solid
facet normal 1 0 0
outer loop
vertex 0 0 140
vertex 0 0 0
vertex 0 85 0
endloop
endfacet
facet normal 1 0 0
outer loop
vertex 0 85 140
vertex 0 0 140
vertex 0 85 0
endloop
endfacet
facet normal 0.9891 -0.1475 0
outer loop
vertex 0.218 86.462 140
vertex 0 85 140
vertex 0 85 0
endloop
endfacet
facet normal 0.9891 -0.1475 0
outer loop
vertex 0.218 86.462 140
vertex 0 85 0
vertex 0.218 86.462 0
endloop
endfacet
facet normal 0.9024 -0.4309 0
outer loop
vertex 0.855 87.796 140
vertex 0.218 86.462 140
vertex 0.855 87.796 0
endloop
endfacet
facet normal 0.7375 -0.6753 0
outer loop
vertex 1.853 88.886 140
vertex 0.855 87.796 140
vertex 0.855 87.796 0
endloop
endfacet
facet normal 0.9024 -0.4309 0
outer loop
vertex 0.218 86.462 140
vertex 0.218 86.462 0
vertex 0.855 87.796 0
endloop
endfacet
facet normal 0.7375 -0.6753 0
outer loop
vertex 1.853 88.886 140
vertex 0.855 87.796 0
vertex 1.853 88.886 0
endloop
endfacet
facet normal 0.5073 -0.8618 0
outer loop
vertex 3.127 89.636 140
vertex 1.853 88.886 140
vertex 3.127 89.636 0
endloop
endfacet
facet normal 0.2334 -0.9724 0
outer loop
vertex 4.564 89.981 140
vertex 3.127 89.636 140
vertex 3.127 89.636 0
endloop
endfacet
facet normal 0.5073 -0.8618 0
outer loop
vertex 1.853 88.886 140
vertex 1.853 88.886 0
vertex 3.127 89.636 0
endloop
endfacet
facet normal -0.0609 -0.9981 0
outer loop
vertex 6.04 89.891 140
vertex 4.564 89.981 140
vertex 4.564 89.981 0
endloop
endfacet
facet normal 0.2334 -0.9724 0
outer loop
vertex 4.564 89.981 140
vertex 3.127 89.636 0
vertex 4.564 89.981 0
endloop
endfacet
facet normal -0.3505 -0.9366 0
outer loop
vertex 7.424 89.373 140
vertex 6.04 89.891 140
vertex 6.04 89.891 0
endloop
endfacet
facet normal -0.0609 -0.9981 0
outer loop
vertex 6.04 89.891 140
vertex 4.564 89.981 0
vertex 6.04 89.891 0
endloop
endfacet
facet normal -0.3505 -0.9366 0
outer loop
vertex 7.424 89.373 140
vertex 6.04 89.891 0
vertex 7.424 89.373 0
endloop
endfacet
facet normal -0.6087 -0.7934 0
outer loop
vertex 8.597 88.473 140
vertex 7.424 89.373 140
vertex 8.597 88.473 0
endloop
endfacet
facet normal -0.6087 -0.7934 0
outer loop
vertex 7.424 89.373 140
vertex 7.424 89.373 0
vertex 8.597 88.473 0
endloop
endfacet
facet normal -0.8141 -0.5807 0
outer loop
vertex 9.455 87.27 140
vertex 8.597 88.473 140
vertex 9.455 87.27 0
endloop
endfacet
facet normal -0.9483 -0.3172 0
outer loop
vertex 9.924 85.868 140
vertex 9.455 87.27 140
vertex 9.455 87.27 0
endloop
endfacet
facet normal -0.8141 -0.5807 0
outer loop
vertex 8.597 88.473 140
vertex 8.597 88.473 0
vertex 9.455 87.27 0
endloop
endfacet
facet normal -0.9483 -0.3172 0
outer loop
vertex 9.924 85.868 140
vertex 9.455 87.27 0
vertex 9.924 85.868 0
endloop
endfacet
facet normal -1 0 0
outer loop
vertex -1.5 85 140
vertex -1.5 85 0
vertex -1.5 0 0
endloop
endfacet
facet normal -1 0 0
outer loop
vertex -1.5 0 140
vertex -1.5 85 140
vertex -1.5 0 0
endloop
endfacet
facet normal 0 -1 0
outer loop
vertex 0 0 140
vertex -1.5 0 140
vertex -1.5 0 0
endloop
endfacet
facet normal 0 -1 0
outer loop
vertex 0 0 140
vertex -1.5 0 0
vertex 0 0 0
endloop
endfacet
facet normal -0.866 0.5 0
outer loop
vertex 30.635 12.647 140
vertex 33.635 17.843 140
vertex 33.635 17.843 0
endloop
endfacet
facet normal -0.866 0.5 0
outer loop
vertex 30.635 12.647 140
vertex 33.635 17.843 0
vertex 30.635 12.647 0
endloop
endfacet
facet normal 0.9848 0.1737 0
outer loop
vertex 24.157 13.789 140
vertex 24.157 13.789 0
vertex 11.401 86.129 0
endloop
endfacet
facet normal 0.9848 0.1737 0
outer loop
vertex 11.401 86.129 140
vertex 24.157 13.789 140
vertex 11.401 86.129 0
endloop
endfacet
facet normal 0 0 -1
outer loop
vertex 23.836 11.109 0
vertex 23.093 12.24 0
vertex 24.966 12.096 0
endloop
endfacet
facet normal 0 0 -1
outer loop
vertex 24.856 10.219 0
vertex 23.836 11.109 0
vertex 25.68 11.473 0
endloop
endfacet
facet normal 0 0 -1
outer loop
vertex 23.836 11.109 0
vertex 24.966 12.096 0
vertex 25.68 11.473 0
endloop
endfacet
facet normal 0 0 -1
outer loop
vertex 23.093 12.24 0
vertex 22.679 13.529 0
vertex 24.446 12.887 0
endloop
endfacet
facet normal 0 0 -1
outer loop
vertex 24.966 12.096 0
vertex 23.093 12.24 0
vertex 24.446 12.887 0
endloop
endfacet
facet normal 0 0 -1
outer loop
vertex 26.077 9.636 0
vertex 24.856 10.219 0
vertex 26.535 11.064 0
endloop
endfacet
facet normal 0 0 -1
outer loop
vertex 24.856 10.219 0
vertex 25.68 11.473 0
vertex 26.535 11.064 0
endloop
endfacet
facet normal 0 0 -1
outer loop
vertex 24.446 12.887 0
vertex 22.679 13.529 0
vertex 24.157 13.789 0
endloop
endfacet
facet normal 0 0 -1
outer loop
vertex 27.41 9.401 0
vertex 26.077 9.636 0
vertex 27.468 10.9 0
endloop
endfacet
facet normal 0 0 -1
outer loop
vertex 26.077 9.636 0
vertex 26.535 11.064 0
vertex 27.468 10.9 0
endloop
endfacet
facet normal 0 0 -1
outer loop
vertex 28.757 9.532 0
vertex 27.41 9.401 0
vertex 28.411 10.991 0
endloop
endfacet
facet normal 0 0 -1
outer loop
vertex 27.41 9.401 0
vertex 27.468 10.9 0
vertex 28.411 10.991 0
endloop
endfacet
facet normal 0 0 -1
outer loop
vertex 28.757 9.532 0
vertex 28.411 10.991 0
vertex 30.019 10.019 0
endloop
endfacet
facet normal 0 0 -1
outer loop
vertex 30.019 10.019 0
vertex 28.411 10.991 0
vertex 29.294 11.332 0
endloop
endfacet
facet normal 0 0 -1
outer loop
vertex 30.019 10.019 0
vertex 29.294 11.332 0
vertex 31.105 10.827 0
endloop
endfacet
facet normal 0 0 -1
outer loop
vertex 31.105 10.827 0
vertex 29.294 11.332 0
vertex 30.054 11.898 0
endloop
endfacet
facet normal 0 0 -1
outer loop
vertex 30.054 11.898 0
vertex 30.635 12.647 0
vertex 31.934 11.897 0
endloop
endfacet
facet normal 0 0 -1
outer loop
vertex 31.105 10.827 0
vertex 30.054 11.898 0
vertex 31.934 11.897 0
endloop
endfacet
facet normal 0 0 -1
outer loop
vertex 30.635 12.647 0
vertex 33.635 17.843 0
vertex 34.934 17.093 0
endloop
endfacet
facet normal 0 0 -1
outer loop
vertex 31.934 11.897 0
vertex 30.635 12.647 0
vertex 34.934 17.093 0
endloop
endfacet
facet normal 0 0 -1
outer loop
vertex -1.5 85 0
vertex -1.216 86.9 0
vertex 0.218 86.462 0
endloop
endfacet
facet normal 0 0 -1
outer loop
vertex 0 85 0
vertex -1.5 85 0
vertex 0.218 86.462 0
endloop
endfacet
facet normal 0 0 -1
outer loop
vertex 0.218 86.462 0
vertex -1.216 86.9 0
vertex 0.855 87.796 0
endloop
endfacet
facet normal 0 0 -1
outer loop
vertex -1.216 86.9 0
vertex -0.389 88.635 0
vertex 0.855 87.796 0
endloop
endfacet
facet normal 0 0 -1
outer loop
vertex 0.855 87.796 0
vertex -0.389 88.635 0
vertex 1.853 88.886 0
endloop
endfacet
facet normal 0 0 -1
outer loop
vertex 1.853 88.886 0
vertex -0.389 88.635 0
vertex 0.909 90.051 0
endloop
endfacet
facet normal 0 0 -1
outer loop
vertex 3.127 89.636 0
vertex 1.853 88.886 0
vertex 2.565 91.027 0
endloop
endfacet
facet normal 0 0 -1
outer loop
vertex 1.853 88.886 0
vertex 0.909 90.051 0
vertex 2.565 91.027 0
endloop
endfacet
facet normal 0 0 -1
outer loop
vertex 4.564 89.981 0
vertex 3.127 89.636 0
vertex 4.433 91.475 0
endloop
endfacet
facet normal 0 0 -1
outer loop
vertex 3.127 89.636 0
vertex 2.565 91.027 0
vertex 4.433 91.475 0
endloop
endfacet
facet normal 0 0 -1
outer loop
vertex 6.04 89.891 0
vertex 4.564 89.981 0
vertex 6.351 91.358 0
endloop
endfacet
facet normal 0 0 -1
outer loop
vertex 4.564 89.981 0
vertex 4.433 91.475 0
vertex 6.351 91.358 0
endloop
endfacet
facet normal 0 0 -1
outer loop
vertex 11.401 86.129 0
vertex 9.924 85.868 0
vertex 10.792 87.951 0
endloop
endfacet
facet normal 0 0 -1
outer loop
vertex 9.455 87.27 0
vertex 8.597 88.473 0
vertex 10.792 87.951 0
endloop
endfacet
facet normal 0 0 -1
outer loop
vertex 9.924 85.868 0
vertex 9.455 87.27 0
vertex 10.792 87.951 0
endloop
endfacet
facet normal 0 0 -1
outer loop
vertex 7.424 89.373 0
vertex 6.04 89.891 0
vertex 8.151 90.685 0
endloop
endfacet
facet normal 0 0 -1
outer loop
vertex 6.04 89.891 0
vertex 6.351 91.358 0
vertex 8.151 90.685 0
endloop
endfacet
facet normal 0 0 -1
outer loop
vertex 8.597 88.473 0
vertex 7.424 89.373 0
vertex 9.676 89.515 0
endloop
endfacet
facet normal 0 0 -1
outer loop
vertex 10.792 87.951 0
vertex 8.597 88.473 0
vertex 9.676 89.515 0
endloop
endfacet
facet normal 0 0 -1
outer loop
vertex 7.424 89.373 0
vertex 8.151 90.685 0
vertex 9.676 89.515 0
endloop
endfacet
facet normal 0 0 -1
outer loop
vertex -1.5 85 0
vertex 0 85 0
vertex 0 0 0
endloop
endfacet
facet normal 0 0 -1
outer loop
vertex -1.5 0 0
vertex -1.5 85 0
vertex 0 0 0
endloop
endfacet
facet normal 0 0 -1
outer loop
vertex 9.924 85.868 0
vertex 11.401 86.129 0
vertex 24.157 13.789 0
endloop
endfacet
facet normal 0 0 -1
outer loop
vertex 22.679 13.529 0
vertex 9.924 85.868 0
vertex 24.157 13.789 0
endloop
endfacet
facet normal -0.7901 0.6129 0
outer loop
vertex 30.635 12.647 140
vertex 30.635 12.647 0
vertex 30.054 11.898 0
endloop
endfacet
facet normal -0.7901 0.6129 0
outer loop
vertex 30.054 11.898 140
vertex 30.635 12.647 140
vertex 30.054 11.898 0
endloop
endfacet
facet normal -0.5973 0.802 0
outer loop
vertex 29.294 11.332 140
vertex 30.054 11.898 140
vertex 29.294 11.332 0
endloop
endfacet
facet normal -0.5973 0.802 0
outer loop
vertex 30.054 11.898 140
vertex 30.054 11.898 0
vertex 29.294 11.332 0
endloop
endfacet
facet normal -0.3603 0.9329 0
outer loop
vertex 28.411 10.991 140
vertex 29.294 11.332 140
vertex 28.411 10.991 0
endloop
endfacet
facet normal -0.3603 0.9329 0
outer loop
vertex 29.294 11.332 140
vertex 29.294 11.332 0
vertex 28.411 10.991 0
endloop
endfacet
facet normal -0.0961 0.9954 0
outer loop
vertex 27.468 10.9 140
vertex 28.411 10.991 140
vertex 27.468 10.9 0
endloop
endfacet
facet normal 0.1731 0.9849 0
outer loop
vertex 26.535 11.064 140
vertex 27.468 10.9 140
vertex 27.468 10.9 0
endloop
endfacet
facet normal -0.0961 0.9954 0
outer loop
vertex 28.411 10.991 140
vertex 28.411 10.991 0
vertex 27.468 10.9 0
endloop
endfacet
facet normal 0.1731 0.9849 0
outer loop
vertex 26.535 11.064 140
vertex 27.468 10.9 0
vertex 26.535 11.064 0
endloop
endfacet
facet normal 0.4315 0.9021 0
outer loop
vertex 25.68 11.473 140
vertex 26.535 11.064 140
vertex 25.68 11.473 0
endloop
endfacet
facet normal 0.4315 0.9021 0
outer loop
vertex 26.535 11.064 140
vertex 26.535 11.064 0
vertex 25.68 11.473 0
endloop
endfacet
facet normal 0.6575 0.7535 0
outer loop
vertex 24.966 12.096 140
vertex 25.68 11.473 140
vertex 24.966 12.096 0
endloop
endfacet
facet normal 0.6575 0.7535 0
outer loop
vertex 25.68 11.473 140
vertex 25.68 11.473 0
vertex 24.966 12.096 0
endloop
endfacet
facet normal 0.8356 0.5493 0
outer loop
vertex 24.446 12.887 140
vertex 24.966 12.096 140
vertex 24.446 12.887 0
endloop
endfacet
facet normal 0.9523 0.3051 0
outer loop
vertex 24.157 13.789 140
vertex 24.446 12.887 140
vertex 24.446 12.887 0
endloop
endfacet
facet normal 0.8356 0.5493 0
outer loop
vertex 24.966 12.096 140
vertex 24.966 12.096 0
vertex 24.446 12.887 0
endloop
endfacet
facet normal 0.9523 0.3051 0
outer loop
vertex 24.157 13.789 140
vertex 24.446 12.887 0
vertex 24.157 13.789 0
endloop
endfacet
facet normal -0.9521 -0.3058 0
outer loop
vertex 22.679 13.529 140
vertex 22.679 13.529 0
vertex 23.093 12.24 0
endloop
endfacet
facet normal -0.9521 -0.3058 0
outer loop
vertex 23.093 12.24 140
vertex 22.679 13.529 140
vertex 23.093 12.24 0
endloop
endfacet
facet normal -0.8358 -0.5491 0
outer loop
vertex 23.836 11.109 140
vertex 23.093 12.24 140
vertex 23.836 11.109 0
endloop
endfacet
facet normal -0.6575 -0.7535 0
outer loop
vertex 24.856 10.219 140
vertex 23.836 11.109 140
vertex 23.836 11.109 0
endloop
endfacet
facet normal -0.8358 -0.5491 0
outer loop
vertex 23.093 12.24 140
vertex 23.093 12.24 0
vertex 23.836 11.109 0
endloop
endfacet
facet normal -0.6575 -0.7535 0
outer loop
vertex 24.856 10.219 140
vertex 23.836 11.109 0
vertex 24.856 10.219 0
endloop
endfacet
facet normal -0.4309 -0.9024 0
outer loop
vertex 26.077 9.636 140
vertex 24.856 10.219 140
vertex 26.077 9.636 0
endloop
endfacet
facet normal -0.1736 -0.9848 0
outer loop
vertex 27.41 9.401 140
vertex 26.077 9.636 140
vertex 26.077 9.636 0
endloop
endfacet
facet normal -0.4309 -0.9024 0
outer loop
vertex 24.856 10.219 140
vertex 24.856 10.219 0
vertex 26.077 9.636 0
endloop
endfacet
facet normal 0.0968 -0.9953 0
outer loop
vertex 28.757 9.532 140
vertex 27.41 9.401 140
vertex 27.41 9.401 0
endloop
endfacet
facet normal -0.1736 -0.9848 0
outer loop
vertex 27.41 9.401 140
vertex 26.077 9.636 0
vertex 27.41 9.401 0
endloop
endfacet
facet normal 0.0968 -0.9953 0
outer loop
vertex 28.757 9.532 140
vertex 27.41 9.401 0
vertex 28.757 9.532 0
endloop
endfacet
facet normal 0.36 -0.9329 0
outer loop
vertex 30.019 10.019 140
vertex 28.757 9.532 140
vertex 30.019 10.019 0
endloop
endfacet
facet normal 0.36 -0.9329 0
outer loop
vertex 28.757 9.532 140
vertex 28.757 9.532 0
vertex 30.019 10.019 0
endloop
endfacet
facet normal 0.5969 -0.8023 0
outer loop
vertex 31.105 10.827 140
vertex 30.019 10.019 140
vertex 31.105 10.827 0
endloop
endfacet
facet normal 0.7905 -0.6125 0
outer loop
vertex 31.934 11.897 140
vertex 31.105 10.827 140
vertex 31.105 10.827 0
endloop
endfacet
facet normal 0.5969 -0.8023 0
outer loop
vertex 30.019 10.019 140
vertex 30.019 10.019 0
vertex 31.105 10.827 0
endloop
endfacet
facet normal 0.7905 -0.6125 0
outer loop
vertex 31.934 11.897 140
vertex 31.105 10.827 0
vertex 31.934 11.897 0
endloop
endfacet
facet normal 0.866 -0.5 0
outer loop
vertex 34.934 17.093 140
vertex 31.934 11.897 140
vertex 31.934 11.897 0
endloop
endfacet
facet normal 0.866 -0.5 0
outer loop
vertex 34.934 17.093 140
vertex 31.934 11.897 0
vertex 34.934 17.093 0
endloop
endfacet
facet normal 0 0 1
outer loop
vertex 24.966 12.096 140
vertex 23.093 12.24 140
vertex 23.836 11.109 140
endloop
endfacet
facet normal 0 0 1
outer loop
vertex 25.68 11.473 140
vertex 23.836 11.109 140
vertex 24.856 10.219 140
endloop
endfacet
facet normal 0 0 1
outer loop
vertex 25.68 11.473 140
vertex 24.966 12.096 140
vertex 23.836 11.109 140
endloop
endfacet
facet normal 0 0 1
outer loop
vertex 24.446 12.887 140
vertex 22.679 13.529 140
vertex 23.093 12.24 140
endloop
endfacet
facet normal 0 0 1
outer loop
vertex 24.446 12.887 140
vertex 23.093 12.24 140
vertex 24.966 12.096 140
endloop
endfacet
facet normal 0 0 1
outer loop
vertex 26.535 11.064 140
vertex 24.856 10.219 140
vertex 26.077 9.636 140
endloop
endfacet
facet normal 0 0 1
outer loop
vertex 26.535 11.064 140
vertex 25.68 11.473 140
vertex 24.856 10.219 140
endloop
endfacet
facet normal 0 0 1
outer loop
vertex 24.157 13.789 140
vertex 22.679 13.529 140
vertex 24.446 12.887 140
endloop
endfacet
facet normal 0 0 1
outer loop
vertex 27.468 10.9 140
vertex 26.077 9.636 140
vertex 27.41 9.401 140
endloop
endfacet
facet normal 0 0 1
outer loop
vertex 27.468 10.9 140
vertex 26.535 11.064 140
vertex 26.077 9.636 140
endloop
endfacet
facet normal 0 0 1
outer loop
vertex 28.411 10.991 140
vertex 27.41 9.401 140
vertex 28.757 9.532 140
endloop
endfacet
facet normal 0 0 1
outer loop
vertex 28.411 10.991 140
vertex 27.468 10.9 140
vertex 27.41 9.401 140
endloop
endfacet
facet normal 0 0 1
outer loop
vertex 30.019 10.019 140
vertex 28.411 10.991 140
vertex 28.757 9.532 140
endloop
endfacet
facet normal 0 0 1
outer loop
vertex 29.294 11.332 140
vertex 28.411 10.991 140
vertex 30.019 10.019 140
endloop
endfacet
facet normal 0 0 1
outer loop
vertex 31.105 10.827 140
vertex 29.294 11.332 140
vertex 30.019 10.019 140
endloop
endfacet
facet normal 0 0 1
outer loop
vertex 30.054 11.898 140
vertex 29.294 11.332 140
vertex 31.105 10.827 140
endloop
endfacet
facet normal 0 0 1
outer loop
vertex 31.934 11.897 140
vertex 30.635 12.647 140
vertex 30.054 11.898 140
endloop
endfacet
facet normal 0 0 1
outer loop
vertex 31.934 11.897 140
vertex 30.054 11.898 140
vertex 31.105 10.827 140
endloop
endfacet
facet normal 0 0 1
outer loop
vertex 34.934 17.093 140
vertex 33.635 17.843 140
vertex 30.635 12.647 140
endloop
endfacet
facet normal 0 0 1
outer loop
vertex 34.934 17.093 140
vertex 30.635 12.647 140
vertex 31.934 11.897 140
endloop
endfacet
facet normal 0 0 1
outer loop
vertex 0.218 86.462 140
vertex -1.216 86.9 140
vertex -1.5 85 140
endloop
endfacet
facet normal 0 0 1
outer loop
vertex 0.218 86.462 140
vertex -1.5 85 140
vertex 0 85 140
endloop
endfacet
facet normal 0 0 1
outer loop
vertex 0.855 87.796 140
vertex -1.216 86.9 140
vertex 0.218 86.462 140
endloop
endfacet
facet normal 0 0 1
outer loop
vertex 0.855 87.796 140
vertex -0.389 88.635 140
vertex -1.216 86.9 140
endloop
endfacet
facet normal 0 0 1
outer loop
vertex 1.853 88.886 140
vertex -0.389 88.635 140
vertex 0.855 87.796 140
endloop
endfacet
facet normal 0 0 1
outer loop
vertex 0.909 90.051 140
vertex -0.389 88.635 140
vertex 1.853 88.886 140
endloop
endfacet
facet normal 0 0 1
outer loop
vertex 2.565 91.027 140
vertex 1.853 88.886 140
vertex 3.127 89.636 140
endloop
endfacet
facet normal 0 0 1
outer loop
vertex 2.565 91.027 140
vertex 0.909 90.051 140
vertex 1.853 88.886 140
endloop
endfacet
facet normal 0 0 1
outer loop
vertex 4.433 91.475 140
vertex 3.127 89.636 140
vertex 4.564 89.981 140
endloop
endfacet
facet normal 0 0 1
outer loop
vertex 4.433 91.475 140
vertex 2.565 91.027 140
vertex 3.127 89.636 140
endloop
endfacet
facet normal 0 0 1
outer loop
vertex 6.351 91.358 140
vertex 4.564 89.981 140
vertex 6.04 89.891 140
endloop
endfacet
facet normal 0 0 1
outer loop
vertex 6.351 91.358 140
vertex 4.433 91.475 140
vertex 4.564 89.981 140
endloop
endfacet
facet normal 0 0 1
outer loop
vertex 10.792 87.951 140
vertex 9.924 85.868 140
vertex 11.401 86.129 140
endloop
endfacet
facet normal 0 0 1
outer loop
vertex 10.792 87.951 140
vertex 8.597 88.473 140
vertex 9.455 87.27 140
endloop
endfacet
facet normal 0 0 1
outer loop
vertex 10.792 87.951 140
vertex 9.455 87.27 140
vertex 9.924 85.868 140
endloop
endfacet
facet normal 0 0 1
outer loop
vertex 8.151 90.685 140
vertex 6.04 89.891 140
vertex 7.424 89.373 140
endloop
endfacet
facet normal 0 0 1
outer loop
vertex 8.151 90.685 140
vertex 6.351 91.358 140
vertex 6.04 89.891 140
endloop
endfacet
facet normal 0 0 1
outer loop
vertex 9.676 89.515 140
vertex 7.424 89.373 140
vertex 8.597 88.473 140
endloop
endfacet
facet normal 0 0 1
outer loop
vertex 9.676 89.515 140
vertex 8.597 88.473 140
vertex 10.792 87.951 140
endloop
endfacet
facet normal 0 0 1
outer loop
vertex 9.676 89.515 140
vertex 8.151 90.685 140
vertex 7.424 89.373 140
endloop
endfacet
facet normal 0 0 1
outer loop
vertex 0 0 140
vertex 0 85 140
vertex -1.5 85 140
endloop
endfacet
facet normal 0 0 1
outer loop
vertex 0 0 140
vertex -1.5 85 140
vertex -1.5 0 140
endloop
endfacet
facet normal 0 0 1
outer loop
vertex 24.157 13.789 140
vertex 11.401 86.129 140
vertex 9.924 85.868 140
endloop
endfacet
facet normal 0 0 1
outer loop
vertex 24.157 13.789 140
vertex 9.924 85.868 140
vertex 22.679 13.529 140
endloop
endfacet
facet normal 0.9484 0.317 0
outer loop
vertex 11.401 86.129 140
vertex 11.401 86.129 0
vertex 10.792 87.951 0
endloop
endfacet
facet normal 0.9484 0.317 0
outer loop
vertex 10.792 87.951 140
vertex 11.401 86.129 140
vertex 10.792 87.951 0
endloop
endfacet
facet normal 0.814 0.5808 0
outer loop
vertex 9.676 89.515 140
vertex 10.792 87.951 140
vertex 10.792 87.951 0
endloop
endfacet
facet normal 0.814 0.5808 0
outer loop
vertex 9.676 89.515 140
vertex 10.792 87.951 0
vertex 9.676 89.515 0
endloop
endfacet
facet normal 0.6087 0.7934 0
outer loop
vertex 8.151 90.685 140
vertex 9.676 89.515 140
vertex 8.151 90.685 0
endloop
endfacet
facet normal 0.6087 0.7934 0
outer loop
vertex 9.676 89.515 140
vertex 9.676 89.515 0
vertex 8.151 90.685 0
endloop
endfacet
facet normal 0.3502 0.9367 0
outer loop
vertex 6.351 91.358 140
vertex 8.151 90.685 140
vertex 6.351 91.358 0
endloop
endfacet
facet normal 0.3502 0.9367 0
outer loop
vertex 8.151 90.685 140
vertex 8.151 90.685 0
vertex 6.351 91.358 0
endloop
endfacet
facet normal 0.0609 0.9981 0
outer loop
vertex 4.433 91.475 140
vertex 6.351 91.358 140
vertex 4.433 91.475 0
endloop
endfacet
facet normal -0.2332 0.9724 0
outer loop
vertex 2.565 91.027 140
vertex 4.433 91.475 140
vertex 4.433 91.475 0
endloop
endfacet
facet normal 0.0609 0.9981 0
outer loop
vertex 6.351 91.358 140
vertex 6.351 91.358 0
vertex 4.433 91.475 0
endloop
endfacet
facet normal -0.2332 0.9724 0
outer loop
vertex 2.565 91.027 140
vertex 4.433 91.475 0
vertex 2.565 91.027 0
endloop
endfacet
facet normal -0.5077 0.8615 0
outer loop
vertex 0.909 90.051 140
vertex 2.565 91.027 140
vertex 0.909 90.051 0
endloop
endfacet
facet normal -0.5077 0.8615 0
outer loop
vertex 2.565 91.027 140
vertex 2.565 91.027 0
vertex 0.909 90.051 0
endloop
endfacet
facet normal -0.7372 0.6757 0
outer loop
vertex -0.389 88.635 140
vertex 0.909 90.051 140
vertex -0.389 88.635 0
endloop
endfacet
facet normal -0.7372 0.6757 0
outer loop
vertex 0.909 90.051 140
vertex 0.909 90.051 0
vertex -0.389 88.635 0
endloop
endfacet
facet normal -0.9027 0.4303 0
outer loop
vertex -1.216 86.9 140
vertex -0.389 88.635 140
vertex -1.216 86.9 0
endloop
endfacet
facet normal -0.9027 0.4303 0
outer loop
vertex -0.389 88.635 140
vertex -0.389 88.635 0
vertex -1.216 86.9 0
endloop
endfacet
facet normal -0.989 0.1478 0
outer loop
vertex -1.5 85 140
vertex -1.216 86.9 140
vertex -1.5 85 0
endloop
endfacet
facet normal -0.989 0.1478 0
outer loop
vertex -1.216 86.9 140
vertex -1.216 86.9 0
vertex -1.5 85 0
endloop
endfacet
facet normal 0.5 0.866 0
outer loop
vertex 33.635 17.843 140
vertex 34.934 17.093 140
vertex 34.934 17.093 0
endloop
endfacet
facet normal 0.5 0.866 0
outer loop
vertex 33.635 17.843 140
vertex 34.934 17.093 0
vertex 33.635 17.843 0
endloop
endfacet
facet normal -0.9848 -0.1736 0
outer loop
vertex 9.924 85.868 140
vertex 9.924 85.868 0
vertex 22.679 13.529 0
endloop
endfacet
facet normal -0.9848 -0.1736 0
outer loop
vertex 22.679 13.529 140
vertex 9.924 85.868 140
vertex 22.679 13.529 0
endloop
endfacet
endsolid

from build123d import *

# Parameters (mm, degrees)
F1_DEPTH = 140


with BuildPart() as f1:
    # F0 (on Top) → F1 (new body)
    with BuildSketch(Plane.XY):
        with BuildLine():
            Line((-1.5, 0), (0, 0))
            Line((0, 0), (0, 85))
            ThreePointArc((0, 85), (4.564221, 89.980973), (9.924039, 85.868241))
            Line((9.924039, 85.868241), (22.679454, 13.528685))
            ThreePointArc((22.679454, 13.528685), (26.735252, 9.472887), (31.93362, 11.896926))
            Line((31.93362, 11.896926), (34.93362, 17.093079))
            Line((34.93362, 17.093079), (33.634582, 17.843079))
            Line((33.634582, 17.843079), (30.634582, 12.646926))
            ThreePointArc((30.634582, 12.646926), (26.995724, 10.950099), (24.156666, 13.789158))
            Line((24.156666, 13.789158), (11.40125, 86.128713))
            ThreePointArc((11.40125, 86.128713), (4.433488, 91.475266), (-1.5, 85))
            Line((-1.5, 85), (-1.5, 0))
        make_face()
    extrude(amount=F1_DEPTH)


solid = f1.part
